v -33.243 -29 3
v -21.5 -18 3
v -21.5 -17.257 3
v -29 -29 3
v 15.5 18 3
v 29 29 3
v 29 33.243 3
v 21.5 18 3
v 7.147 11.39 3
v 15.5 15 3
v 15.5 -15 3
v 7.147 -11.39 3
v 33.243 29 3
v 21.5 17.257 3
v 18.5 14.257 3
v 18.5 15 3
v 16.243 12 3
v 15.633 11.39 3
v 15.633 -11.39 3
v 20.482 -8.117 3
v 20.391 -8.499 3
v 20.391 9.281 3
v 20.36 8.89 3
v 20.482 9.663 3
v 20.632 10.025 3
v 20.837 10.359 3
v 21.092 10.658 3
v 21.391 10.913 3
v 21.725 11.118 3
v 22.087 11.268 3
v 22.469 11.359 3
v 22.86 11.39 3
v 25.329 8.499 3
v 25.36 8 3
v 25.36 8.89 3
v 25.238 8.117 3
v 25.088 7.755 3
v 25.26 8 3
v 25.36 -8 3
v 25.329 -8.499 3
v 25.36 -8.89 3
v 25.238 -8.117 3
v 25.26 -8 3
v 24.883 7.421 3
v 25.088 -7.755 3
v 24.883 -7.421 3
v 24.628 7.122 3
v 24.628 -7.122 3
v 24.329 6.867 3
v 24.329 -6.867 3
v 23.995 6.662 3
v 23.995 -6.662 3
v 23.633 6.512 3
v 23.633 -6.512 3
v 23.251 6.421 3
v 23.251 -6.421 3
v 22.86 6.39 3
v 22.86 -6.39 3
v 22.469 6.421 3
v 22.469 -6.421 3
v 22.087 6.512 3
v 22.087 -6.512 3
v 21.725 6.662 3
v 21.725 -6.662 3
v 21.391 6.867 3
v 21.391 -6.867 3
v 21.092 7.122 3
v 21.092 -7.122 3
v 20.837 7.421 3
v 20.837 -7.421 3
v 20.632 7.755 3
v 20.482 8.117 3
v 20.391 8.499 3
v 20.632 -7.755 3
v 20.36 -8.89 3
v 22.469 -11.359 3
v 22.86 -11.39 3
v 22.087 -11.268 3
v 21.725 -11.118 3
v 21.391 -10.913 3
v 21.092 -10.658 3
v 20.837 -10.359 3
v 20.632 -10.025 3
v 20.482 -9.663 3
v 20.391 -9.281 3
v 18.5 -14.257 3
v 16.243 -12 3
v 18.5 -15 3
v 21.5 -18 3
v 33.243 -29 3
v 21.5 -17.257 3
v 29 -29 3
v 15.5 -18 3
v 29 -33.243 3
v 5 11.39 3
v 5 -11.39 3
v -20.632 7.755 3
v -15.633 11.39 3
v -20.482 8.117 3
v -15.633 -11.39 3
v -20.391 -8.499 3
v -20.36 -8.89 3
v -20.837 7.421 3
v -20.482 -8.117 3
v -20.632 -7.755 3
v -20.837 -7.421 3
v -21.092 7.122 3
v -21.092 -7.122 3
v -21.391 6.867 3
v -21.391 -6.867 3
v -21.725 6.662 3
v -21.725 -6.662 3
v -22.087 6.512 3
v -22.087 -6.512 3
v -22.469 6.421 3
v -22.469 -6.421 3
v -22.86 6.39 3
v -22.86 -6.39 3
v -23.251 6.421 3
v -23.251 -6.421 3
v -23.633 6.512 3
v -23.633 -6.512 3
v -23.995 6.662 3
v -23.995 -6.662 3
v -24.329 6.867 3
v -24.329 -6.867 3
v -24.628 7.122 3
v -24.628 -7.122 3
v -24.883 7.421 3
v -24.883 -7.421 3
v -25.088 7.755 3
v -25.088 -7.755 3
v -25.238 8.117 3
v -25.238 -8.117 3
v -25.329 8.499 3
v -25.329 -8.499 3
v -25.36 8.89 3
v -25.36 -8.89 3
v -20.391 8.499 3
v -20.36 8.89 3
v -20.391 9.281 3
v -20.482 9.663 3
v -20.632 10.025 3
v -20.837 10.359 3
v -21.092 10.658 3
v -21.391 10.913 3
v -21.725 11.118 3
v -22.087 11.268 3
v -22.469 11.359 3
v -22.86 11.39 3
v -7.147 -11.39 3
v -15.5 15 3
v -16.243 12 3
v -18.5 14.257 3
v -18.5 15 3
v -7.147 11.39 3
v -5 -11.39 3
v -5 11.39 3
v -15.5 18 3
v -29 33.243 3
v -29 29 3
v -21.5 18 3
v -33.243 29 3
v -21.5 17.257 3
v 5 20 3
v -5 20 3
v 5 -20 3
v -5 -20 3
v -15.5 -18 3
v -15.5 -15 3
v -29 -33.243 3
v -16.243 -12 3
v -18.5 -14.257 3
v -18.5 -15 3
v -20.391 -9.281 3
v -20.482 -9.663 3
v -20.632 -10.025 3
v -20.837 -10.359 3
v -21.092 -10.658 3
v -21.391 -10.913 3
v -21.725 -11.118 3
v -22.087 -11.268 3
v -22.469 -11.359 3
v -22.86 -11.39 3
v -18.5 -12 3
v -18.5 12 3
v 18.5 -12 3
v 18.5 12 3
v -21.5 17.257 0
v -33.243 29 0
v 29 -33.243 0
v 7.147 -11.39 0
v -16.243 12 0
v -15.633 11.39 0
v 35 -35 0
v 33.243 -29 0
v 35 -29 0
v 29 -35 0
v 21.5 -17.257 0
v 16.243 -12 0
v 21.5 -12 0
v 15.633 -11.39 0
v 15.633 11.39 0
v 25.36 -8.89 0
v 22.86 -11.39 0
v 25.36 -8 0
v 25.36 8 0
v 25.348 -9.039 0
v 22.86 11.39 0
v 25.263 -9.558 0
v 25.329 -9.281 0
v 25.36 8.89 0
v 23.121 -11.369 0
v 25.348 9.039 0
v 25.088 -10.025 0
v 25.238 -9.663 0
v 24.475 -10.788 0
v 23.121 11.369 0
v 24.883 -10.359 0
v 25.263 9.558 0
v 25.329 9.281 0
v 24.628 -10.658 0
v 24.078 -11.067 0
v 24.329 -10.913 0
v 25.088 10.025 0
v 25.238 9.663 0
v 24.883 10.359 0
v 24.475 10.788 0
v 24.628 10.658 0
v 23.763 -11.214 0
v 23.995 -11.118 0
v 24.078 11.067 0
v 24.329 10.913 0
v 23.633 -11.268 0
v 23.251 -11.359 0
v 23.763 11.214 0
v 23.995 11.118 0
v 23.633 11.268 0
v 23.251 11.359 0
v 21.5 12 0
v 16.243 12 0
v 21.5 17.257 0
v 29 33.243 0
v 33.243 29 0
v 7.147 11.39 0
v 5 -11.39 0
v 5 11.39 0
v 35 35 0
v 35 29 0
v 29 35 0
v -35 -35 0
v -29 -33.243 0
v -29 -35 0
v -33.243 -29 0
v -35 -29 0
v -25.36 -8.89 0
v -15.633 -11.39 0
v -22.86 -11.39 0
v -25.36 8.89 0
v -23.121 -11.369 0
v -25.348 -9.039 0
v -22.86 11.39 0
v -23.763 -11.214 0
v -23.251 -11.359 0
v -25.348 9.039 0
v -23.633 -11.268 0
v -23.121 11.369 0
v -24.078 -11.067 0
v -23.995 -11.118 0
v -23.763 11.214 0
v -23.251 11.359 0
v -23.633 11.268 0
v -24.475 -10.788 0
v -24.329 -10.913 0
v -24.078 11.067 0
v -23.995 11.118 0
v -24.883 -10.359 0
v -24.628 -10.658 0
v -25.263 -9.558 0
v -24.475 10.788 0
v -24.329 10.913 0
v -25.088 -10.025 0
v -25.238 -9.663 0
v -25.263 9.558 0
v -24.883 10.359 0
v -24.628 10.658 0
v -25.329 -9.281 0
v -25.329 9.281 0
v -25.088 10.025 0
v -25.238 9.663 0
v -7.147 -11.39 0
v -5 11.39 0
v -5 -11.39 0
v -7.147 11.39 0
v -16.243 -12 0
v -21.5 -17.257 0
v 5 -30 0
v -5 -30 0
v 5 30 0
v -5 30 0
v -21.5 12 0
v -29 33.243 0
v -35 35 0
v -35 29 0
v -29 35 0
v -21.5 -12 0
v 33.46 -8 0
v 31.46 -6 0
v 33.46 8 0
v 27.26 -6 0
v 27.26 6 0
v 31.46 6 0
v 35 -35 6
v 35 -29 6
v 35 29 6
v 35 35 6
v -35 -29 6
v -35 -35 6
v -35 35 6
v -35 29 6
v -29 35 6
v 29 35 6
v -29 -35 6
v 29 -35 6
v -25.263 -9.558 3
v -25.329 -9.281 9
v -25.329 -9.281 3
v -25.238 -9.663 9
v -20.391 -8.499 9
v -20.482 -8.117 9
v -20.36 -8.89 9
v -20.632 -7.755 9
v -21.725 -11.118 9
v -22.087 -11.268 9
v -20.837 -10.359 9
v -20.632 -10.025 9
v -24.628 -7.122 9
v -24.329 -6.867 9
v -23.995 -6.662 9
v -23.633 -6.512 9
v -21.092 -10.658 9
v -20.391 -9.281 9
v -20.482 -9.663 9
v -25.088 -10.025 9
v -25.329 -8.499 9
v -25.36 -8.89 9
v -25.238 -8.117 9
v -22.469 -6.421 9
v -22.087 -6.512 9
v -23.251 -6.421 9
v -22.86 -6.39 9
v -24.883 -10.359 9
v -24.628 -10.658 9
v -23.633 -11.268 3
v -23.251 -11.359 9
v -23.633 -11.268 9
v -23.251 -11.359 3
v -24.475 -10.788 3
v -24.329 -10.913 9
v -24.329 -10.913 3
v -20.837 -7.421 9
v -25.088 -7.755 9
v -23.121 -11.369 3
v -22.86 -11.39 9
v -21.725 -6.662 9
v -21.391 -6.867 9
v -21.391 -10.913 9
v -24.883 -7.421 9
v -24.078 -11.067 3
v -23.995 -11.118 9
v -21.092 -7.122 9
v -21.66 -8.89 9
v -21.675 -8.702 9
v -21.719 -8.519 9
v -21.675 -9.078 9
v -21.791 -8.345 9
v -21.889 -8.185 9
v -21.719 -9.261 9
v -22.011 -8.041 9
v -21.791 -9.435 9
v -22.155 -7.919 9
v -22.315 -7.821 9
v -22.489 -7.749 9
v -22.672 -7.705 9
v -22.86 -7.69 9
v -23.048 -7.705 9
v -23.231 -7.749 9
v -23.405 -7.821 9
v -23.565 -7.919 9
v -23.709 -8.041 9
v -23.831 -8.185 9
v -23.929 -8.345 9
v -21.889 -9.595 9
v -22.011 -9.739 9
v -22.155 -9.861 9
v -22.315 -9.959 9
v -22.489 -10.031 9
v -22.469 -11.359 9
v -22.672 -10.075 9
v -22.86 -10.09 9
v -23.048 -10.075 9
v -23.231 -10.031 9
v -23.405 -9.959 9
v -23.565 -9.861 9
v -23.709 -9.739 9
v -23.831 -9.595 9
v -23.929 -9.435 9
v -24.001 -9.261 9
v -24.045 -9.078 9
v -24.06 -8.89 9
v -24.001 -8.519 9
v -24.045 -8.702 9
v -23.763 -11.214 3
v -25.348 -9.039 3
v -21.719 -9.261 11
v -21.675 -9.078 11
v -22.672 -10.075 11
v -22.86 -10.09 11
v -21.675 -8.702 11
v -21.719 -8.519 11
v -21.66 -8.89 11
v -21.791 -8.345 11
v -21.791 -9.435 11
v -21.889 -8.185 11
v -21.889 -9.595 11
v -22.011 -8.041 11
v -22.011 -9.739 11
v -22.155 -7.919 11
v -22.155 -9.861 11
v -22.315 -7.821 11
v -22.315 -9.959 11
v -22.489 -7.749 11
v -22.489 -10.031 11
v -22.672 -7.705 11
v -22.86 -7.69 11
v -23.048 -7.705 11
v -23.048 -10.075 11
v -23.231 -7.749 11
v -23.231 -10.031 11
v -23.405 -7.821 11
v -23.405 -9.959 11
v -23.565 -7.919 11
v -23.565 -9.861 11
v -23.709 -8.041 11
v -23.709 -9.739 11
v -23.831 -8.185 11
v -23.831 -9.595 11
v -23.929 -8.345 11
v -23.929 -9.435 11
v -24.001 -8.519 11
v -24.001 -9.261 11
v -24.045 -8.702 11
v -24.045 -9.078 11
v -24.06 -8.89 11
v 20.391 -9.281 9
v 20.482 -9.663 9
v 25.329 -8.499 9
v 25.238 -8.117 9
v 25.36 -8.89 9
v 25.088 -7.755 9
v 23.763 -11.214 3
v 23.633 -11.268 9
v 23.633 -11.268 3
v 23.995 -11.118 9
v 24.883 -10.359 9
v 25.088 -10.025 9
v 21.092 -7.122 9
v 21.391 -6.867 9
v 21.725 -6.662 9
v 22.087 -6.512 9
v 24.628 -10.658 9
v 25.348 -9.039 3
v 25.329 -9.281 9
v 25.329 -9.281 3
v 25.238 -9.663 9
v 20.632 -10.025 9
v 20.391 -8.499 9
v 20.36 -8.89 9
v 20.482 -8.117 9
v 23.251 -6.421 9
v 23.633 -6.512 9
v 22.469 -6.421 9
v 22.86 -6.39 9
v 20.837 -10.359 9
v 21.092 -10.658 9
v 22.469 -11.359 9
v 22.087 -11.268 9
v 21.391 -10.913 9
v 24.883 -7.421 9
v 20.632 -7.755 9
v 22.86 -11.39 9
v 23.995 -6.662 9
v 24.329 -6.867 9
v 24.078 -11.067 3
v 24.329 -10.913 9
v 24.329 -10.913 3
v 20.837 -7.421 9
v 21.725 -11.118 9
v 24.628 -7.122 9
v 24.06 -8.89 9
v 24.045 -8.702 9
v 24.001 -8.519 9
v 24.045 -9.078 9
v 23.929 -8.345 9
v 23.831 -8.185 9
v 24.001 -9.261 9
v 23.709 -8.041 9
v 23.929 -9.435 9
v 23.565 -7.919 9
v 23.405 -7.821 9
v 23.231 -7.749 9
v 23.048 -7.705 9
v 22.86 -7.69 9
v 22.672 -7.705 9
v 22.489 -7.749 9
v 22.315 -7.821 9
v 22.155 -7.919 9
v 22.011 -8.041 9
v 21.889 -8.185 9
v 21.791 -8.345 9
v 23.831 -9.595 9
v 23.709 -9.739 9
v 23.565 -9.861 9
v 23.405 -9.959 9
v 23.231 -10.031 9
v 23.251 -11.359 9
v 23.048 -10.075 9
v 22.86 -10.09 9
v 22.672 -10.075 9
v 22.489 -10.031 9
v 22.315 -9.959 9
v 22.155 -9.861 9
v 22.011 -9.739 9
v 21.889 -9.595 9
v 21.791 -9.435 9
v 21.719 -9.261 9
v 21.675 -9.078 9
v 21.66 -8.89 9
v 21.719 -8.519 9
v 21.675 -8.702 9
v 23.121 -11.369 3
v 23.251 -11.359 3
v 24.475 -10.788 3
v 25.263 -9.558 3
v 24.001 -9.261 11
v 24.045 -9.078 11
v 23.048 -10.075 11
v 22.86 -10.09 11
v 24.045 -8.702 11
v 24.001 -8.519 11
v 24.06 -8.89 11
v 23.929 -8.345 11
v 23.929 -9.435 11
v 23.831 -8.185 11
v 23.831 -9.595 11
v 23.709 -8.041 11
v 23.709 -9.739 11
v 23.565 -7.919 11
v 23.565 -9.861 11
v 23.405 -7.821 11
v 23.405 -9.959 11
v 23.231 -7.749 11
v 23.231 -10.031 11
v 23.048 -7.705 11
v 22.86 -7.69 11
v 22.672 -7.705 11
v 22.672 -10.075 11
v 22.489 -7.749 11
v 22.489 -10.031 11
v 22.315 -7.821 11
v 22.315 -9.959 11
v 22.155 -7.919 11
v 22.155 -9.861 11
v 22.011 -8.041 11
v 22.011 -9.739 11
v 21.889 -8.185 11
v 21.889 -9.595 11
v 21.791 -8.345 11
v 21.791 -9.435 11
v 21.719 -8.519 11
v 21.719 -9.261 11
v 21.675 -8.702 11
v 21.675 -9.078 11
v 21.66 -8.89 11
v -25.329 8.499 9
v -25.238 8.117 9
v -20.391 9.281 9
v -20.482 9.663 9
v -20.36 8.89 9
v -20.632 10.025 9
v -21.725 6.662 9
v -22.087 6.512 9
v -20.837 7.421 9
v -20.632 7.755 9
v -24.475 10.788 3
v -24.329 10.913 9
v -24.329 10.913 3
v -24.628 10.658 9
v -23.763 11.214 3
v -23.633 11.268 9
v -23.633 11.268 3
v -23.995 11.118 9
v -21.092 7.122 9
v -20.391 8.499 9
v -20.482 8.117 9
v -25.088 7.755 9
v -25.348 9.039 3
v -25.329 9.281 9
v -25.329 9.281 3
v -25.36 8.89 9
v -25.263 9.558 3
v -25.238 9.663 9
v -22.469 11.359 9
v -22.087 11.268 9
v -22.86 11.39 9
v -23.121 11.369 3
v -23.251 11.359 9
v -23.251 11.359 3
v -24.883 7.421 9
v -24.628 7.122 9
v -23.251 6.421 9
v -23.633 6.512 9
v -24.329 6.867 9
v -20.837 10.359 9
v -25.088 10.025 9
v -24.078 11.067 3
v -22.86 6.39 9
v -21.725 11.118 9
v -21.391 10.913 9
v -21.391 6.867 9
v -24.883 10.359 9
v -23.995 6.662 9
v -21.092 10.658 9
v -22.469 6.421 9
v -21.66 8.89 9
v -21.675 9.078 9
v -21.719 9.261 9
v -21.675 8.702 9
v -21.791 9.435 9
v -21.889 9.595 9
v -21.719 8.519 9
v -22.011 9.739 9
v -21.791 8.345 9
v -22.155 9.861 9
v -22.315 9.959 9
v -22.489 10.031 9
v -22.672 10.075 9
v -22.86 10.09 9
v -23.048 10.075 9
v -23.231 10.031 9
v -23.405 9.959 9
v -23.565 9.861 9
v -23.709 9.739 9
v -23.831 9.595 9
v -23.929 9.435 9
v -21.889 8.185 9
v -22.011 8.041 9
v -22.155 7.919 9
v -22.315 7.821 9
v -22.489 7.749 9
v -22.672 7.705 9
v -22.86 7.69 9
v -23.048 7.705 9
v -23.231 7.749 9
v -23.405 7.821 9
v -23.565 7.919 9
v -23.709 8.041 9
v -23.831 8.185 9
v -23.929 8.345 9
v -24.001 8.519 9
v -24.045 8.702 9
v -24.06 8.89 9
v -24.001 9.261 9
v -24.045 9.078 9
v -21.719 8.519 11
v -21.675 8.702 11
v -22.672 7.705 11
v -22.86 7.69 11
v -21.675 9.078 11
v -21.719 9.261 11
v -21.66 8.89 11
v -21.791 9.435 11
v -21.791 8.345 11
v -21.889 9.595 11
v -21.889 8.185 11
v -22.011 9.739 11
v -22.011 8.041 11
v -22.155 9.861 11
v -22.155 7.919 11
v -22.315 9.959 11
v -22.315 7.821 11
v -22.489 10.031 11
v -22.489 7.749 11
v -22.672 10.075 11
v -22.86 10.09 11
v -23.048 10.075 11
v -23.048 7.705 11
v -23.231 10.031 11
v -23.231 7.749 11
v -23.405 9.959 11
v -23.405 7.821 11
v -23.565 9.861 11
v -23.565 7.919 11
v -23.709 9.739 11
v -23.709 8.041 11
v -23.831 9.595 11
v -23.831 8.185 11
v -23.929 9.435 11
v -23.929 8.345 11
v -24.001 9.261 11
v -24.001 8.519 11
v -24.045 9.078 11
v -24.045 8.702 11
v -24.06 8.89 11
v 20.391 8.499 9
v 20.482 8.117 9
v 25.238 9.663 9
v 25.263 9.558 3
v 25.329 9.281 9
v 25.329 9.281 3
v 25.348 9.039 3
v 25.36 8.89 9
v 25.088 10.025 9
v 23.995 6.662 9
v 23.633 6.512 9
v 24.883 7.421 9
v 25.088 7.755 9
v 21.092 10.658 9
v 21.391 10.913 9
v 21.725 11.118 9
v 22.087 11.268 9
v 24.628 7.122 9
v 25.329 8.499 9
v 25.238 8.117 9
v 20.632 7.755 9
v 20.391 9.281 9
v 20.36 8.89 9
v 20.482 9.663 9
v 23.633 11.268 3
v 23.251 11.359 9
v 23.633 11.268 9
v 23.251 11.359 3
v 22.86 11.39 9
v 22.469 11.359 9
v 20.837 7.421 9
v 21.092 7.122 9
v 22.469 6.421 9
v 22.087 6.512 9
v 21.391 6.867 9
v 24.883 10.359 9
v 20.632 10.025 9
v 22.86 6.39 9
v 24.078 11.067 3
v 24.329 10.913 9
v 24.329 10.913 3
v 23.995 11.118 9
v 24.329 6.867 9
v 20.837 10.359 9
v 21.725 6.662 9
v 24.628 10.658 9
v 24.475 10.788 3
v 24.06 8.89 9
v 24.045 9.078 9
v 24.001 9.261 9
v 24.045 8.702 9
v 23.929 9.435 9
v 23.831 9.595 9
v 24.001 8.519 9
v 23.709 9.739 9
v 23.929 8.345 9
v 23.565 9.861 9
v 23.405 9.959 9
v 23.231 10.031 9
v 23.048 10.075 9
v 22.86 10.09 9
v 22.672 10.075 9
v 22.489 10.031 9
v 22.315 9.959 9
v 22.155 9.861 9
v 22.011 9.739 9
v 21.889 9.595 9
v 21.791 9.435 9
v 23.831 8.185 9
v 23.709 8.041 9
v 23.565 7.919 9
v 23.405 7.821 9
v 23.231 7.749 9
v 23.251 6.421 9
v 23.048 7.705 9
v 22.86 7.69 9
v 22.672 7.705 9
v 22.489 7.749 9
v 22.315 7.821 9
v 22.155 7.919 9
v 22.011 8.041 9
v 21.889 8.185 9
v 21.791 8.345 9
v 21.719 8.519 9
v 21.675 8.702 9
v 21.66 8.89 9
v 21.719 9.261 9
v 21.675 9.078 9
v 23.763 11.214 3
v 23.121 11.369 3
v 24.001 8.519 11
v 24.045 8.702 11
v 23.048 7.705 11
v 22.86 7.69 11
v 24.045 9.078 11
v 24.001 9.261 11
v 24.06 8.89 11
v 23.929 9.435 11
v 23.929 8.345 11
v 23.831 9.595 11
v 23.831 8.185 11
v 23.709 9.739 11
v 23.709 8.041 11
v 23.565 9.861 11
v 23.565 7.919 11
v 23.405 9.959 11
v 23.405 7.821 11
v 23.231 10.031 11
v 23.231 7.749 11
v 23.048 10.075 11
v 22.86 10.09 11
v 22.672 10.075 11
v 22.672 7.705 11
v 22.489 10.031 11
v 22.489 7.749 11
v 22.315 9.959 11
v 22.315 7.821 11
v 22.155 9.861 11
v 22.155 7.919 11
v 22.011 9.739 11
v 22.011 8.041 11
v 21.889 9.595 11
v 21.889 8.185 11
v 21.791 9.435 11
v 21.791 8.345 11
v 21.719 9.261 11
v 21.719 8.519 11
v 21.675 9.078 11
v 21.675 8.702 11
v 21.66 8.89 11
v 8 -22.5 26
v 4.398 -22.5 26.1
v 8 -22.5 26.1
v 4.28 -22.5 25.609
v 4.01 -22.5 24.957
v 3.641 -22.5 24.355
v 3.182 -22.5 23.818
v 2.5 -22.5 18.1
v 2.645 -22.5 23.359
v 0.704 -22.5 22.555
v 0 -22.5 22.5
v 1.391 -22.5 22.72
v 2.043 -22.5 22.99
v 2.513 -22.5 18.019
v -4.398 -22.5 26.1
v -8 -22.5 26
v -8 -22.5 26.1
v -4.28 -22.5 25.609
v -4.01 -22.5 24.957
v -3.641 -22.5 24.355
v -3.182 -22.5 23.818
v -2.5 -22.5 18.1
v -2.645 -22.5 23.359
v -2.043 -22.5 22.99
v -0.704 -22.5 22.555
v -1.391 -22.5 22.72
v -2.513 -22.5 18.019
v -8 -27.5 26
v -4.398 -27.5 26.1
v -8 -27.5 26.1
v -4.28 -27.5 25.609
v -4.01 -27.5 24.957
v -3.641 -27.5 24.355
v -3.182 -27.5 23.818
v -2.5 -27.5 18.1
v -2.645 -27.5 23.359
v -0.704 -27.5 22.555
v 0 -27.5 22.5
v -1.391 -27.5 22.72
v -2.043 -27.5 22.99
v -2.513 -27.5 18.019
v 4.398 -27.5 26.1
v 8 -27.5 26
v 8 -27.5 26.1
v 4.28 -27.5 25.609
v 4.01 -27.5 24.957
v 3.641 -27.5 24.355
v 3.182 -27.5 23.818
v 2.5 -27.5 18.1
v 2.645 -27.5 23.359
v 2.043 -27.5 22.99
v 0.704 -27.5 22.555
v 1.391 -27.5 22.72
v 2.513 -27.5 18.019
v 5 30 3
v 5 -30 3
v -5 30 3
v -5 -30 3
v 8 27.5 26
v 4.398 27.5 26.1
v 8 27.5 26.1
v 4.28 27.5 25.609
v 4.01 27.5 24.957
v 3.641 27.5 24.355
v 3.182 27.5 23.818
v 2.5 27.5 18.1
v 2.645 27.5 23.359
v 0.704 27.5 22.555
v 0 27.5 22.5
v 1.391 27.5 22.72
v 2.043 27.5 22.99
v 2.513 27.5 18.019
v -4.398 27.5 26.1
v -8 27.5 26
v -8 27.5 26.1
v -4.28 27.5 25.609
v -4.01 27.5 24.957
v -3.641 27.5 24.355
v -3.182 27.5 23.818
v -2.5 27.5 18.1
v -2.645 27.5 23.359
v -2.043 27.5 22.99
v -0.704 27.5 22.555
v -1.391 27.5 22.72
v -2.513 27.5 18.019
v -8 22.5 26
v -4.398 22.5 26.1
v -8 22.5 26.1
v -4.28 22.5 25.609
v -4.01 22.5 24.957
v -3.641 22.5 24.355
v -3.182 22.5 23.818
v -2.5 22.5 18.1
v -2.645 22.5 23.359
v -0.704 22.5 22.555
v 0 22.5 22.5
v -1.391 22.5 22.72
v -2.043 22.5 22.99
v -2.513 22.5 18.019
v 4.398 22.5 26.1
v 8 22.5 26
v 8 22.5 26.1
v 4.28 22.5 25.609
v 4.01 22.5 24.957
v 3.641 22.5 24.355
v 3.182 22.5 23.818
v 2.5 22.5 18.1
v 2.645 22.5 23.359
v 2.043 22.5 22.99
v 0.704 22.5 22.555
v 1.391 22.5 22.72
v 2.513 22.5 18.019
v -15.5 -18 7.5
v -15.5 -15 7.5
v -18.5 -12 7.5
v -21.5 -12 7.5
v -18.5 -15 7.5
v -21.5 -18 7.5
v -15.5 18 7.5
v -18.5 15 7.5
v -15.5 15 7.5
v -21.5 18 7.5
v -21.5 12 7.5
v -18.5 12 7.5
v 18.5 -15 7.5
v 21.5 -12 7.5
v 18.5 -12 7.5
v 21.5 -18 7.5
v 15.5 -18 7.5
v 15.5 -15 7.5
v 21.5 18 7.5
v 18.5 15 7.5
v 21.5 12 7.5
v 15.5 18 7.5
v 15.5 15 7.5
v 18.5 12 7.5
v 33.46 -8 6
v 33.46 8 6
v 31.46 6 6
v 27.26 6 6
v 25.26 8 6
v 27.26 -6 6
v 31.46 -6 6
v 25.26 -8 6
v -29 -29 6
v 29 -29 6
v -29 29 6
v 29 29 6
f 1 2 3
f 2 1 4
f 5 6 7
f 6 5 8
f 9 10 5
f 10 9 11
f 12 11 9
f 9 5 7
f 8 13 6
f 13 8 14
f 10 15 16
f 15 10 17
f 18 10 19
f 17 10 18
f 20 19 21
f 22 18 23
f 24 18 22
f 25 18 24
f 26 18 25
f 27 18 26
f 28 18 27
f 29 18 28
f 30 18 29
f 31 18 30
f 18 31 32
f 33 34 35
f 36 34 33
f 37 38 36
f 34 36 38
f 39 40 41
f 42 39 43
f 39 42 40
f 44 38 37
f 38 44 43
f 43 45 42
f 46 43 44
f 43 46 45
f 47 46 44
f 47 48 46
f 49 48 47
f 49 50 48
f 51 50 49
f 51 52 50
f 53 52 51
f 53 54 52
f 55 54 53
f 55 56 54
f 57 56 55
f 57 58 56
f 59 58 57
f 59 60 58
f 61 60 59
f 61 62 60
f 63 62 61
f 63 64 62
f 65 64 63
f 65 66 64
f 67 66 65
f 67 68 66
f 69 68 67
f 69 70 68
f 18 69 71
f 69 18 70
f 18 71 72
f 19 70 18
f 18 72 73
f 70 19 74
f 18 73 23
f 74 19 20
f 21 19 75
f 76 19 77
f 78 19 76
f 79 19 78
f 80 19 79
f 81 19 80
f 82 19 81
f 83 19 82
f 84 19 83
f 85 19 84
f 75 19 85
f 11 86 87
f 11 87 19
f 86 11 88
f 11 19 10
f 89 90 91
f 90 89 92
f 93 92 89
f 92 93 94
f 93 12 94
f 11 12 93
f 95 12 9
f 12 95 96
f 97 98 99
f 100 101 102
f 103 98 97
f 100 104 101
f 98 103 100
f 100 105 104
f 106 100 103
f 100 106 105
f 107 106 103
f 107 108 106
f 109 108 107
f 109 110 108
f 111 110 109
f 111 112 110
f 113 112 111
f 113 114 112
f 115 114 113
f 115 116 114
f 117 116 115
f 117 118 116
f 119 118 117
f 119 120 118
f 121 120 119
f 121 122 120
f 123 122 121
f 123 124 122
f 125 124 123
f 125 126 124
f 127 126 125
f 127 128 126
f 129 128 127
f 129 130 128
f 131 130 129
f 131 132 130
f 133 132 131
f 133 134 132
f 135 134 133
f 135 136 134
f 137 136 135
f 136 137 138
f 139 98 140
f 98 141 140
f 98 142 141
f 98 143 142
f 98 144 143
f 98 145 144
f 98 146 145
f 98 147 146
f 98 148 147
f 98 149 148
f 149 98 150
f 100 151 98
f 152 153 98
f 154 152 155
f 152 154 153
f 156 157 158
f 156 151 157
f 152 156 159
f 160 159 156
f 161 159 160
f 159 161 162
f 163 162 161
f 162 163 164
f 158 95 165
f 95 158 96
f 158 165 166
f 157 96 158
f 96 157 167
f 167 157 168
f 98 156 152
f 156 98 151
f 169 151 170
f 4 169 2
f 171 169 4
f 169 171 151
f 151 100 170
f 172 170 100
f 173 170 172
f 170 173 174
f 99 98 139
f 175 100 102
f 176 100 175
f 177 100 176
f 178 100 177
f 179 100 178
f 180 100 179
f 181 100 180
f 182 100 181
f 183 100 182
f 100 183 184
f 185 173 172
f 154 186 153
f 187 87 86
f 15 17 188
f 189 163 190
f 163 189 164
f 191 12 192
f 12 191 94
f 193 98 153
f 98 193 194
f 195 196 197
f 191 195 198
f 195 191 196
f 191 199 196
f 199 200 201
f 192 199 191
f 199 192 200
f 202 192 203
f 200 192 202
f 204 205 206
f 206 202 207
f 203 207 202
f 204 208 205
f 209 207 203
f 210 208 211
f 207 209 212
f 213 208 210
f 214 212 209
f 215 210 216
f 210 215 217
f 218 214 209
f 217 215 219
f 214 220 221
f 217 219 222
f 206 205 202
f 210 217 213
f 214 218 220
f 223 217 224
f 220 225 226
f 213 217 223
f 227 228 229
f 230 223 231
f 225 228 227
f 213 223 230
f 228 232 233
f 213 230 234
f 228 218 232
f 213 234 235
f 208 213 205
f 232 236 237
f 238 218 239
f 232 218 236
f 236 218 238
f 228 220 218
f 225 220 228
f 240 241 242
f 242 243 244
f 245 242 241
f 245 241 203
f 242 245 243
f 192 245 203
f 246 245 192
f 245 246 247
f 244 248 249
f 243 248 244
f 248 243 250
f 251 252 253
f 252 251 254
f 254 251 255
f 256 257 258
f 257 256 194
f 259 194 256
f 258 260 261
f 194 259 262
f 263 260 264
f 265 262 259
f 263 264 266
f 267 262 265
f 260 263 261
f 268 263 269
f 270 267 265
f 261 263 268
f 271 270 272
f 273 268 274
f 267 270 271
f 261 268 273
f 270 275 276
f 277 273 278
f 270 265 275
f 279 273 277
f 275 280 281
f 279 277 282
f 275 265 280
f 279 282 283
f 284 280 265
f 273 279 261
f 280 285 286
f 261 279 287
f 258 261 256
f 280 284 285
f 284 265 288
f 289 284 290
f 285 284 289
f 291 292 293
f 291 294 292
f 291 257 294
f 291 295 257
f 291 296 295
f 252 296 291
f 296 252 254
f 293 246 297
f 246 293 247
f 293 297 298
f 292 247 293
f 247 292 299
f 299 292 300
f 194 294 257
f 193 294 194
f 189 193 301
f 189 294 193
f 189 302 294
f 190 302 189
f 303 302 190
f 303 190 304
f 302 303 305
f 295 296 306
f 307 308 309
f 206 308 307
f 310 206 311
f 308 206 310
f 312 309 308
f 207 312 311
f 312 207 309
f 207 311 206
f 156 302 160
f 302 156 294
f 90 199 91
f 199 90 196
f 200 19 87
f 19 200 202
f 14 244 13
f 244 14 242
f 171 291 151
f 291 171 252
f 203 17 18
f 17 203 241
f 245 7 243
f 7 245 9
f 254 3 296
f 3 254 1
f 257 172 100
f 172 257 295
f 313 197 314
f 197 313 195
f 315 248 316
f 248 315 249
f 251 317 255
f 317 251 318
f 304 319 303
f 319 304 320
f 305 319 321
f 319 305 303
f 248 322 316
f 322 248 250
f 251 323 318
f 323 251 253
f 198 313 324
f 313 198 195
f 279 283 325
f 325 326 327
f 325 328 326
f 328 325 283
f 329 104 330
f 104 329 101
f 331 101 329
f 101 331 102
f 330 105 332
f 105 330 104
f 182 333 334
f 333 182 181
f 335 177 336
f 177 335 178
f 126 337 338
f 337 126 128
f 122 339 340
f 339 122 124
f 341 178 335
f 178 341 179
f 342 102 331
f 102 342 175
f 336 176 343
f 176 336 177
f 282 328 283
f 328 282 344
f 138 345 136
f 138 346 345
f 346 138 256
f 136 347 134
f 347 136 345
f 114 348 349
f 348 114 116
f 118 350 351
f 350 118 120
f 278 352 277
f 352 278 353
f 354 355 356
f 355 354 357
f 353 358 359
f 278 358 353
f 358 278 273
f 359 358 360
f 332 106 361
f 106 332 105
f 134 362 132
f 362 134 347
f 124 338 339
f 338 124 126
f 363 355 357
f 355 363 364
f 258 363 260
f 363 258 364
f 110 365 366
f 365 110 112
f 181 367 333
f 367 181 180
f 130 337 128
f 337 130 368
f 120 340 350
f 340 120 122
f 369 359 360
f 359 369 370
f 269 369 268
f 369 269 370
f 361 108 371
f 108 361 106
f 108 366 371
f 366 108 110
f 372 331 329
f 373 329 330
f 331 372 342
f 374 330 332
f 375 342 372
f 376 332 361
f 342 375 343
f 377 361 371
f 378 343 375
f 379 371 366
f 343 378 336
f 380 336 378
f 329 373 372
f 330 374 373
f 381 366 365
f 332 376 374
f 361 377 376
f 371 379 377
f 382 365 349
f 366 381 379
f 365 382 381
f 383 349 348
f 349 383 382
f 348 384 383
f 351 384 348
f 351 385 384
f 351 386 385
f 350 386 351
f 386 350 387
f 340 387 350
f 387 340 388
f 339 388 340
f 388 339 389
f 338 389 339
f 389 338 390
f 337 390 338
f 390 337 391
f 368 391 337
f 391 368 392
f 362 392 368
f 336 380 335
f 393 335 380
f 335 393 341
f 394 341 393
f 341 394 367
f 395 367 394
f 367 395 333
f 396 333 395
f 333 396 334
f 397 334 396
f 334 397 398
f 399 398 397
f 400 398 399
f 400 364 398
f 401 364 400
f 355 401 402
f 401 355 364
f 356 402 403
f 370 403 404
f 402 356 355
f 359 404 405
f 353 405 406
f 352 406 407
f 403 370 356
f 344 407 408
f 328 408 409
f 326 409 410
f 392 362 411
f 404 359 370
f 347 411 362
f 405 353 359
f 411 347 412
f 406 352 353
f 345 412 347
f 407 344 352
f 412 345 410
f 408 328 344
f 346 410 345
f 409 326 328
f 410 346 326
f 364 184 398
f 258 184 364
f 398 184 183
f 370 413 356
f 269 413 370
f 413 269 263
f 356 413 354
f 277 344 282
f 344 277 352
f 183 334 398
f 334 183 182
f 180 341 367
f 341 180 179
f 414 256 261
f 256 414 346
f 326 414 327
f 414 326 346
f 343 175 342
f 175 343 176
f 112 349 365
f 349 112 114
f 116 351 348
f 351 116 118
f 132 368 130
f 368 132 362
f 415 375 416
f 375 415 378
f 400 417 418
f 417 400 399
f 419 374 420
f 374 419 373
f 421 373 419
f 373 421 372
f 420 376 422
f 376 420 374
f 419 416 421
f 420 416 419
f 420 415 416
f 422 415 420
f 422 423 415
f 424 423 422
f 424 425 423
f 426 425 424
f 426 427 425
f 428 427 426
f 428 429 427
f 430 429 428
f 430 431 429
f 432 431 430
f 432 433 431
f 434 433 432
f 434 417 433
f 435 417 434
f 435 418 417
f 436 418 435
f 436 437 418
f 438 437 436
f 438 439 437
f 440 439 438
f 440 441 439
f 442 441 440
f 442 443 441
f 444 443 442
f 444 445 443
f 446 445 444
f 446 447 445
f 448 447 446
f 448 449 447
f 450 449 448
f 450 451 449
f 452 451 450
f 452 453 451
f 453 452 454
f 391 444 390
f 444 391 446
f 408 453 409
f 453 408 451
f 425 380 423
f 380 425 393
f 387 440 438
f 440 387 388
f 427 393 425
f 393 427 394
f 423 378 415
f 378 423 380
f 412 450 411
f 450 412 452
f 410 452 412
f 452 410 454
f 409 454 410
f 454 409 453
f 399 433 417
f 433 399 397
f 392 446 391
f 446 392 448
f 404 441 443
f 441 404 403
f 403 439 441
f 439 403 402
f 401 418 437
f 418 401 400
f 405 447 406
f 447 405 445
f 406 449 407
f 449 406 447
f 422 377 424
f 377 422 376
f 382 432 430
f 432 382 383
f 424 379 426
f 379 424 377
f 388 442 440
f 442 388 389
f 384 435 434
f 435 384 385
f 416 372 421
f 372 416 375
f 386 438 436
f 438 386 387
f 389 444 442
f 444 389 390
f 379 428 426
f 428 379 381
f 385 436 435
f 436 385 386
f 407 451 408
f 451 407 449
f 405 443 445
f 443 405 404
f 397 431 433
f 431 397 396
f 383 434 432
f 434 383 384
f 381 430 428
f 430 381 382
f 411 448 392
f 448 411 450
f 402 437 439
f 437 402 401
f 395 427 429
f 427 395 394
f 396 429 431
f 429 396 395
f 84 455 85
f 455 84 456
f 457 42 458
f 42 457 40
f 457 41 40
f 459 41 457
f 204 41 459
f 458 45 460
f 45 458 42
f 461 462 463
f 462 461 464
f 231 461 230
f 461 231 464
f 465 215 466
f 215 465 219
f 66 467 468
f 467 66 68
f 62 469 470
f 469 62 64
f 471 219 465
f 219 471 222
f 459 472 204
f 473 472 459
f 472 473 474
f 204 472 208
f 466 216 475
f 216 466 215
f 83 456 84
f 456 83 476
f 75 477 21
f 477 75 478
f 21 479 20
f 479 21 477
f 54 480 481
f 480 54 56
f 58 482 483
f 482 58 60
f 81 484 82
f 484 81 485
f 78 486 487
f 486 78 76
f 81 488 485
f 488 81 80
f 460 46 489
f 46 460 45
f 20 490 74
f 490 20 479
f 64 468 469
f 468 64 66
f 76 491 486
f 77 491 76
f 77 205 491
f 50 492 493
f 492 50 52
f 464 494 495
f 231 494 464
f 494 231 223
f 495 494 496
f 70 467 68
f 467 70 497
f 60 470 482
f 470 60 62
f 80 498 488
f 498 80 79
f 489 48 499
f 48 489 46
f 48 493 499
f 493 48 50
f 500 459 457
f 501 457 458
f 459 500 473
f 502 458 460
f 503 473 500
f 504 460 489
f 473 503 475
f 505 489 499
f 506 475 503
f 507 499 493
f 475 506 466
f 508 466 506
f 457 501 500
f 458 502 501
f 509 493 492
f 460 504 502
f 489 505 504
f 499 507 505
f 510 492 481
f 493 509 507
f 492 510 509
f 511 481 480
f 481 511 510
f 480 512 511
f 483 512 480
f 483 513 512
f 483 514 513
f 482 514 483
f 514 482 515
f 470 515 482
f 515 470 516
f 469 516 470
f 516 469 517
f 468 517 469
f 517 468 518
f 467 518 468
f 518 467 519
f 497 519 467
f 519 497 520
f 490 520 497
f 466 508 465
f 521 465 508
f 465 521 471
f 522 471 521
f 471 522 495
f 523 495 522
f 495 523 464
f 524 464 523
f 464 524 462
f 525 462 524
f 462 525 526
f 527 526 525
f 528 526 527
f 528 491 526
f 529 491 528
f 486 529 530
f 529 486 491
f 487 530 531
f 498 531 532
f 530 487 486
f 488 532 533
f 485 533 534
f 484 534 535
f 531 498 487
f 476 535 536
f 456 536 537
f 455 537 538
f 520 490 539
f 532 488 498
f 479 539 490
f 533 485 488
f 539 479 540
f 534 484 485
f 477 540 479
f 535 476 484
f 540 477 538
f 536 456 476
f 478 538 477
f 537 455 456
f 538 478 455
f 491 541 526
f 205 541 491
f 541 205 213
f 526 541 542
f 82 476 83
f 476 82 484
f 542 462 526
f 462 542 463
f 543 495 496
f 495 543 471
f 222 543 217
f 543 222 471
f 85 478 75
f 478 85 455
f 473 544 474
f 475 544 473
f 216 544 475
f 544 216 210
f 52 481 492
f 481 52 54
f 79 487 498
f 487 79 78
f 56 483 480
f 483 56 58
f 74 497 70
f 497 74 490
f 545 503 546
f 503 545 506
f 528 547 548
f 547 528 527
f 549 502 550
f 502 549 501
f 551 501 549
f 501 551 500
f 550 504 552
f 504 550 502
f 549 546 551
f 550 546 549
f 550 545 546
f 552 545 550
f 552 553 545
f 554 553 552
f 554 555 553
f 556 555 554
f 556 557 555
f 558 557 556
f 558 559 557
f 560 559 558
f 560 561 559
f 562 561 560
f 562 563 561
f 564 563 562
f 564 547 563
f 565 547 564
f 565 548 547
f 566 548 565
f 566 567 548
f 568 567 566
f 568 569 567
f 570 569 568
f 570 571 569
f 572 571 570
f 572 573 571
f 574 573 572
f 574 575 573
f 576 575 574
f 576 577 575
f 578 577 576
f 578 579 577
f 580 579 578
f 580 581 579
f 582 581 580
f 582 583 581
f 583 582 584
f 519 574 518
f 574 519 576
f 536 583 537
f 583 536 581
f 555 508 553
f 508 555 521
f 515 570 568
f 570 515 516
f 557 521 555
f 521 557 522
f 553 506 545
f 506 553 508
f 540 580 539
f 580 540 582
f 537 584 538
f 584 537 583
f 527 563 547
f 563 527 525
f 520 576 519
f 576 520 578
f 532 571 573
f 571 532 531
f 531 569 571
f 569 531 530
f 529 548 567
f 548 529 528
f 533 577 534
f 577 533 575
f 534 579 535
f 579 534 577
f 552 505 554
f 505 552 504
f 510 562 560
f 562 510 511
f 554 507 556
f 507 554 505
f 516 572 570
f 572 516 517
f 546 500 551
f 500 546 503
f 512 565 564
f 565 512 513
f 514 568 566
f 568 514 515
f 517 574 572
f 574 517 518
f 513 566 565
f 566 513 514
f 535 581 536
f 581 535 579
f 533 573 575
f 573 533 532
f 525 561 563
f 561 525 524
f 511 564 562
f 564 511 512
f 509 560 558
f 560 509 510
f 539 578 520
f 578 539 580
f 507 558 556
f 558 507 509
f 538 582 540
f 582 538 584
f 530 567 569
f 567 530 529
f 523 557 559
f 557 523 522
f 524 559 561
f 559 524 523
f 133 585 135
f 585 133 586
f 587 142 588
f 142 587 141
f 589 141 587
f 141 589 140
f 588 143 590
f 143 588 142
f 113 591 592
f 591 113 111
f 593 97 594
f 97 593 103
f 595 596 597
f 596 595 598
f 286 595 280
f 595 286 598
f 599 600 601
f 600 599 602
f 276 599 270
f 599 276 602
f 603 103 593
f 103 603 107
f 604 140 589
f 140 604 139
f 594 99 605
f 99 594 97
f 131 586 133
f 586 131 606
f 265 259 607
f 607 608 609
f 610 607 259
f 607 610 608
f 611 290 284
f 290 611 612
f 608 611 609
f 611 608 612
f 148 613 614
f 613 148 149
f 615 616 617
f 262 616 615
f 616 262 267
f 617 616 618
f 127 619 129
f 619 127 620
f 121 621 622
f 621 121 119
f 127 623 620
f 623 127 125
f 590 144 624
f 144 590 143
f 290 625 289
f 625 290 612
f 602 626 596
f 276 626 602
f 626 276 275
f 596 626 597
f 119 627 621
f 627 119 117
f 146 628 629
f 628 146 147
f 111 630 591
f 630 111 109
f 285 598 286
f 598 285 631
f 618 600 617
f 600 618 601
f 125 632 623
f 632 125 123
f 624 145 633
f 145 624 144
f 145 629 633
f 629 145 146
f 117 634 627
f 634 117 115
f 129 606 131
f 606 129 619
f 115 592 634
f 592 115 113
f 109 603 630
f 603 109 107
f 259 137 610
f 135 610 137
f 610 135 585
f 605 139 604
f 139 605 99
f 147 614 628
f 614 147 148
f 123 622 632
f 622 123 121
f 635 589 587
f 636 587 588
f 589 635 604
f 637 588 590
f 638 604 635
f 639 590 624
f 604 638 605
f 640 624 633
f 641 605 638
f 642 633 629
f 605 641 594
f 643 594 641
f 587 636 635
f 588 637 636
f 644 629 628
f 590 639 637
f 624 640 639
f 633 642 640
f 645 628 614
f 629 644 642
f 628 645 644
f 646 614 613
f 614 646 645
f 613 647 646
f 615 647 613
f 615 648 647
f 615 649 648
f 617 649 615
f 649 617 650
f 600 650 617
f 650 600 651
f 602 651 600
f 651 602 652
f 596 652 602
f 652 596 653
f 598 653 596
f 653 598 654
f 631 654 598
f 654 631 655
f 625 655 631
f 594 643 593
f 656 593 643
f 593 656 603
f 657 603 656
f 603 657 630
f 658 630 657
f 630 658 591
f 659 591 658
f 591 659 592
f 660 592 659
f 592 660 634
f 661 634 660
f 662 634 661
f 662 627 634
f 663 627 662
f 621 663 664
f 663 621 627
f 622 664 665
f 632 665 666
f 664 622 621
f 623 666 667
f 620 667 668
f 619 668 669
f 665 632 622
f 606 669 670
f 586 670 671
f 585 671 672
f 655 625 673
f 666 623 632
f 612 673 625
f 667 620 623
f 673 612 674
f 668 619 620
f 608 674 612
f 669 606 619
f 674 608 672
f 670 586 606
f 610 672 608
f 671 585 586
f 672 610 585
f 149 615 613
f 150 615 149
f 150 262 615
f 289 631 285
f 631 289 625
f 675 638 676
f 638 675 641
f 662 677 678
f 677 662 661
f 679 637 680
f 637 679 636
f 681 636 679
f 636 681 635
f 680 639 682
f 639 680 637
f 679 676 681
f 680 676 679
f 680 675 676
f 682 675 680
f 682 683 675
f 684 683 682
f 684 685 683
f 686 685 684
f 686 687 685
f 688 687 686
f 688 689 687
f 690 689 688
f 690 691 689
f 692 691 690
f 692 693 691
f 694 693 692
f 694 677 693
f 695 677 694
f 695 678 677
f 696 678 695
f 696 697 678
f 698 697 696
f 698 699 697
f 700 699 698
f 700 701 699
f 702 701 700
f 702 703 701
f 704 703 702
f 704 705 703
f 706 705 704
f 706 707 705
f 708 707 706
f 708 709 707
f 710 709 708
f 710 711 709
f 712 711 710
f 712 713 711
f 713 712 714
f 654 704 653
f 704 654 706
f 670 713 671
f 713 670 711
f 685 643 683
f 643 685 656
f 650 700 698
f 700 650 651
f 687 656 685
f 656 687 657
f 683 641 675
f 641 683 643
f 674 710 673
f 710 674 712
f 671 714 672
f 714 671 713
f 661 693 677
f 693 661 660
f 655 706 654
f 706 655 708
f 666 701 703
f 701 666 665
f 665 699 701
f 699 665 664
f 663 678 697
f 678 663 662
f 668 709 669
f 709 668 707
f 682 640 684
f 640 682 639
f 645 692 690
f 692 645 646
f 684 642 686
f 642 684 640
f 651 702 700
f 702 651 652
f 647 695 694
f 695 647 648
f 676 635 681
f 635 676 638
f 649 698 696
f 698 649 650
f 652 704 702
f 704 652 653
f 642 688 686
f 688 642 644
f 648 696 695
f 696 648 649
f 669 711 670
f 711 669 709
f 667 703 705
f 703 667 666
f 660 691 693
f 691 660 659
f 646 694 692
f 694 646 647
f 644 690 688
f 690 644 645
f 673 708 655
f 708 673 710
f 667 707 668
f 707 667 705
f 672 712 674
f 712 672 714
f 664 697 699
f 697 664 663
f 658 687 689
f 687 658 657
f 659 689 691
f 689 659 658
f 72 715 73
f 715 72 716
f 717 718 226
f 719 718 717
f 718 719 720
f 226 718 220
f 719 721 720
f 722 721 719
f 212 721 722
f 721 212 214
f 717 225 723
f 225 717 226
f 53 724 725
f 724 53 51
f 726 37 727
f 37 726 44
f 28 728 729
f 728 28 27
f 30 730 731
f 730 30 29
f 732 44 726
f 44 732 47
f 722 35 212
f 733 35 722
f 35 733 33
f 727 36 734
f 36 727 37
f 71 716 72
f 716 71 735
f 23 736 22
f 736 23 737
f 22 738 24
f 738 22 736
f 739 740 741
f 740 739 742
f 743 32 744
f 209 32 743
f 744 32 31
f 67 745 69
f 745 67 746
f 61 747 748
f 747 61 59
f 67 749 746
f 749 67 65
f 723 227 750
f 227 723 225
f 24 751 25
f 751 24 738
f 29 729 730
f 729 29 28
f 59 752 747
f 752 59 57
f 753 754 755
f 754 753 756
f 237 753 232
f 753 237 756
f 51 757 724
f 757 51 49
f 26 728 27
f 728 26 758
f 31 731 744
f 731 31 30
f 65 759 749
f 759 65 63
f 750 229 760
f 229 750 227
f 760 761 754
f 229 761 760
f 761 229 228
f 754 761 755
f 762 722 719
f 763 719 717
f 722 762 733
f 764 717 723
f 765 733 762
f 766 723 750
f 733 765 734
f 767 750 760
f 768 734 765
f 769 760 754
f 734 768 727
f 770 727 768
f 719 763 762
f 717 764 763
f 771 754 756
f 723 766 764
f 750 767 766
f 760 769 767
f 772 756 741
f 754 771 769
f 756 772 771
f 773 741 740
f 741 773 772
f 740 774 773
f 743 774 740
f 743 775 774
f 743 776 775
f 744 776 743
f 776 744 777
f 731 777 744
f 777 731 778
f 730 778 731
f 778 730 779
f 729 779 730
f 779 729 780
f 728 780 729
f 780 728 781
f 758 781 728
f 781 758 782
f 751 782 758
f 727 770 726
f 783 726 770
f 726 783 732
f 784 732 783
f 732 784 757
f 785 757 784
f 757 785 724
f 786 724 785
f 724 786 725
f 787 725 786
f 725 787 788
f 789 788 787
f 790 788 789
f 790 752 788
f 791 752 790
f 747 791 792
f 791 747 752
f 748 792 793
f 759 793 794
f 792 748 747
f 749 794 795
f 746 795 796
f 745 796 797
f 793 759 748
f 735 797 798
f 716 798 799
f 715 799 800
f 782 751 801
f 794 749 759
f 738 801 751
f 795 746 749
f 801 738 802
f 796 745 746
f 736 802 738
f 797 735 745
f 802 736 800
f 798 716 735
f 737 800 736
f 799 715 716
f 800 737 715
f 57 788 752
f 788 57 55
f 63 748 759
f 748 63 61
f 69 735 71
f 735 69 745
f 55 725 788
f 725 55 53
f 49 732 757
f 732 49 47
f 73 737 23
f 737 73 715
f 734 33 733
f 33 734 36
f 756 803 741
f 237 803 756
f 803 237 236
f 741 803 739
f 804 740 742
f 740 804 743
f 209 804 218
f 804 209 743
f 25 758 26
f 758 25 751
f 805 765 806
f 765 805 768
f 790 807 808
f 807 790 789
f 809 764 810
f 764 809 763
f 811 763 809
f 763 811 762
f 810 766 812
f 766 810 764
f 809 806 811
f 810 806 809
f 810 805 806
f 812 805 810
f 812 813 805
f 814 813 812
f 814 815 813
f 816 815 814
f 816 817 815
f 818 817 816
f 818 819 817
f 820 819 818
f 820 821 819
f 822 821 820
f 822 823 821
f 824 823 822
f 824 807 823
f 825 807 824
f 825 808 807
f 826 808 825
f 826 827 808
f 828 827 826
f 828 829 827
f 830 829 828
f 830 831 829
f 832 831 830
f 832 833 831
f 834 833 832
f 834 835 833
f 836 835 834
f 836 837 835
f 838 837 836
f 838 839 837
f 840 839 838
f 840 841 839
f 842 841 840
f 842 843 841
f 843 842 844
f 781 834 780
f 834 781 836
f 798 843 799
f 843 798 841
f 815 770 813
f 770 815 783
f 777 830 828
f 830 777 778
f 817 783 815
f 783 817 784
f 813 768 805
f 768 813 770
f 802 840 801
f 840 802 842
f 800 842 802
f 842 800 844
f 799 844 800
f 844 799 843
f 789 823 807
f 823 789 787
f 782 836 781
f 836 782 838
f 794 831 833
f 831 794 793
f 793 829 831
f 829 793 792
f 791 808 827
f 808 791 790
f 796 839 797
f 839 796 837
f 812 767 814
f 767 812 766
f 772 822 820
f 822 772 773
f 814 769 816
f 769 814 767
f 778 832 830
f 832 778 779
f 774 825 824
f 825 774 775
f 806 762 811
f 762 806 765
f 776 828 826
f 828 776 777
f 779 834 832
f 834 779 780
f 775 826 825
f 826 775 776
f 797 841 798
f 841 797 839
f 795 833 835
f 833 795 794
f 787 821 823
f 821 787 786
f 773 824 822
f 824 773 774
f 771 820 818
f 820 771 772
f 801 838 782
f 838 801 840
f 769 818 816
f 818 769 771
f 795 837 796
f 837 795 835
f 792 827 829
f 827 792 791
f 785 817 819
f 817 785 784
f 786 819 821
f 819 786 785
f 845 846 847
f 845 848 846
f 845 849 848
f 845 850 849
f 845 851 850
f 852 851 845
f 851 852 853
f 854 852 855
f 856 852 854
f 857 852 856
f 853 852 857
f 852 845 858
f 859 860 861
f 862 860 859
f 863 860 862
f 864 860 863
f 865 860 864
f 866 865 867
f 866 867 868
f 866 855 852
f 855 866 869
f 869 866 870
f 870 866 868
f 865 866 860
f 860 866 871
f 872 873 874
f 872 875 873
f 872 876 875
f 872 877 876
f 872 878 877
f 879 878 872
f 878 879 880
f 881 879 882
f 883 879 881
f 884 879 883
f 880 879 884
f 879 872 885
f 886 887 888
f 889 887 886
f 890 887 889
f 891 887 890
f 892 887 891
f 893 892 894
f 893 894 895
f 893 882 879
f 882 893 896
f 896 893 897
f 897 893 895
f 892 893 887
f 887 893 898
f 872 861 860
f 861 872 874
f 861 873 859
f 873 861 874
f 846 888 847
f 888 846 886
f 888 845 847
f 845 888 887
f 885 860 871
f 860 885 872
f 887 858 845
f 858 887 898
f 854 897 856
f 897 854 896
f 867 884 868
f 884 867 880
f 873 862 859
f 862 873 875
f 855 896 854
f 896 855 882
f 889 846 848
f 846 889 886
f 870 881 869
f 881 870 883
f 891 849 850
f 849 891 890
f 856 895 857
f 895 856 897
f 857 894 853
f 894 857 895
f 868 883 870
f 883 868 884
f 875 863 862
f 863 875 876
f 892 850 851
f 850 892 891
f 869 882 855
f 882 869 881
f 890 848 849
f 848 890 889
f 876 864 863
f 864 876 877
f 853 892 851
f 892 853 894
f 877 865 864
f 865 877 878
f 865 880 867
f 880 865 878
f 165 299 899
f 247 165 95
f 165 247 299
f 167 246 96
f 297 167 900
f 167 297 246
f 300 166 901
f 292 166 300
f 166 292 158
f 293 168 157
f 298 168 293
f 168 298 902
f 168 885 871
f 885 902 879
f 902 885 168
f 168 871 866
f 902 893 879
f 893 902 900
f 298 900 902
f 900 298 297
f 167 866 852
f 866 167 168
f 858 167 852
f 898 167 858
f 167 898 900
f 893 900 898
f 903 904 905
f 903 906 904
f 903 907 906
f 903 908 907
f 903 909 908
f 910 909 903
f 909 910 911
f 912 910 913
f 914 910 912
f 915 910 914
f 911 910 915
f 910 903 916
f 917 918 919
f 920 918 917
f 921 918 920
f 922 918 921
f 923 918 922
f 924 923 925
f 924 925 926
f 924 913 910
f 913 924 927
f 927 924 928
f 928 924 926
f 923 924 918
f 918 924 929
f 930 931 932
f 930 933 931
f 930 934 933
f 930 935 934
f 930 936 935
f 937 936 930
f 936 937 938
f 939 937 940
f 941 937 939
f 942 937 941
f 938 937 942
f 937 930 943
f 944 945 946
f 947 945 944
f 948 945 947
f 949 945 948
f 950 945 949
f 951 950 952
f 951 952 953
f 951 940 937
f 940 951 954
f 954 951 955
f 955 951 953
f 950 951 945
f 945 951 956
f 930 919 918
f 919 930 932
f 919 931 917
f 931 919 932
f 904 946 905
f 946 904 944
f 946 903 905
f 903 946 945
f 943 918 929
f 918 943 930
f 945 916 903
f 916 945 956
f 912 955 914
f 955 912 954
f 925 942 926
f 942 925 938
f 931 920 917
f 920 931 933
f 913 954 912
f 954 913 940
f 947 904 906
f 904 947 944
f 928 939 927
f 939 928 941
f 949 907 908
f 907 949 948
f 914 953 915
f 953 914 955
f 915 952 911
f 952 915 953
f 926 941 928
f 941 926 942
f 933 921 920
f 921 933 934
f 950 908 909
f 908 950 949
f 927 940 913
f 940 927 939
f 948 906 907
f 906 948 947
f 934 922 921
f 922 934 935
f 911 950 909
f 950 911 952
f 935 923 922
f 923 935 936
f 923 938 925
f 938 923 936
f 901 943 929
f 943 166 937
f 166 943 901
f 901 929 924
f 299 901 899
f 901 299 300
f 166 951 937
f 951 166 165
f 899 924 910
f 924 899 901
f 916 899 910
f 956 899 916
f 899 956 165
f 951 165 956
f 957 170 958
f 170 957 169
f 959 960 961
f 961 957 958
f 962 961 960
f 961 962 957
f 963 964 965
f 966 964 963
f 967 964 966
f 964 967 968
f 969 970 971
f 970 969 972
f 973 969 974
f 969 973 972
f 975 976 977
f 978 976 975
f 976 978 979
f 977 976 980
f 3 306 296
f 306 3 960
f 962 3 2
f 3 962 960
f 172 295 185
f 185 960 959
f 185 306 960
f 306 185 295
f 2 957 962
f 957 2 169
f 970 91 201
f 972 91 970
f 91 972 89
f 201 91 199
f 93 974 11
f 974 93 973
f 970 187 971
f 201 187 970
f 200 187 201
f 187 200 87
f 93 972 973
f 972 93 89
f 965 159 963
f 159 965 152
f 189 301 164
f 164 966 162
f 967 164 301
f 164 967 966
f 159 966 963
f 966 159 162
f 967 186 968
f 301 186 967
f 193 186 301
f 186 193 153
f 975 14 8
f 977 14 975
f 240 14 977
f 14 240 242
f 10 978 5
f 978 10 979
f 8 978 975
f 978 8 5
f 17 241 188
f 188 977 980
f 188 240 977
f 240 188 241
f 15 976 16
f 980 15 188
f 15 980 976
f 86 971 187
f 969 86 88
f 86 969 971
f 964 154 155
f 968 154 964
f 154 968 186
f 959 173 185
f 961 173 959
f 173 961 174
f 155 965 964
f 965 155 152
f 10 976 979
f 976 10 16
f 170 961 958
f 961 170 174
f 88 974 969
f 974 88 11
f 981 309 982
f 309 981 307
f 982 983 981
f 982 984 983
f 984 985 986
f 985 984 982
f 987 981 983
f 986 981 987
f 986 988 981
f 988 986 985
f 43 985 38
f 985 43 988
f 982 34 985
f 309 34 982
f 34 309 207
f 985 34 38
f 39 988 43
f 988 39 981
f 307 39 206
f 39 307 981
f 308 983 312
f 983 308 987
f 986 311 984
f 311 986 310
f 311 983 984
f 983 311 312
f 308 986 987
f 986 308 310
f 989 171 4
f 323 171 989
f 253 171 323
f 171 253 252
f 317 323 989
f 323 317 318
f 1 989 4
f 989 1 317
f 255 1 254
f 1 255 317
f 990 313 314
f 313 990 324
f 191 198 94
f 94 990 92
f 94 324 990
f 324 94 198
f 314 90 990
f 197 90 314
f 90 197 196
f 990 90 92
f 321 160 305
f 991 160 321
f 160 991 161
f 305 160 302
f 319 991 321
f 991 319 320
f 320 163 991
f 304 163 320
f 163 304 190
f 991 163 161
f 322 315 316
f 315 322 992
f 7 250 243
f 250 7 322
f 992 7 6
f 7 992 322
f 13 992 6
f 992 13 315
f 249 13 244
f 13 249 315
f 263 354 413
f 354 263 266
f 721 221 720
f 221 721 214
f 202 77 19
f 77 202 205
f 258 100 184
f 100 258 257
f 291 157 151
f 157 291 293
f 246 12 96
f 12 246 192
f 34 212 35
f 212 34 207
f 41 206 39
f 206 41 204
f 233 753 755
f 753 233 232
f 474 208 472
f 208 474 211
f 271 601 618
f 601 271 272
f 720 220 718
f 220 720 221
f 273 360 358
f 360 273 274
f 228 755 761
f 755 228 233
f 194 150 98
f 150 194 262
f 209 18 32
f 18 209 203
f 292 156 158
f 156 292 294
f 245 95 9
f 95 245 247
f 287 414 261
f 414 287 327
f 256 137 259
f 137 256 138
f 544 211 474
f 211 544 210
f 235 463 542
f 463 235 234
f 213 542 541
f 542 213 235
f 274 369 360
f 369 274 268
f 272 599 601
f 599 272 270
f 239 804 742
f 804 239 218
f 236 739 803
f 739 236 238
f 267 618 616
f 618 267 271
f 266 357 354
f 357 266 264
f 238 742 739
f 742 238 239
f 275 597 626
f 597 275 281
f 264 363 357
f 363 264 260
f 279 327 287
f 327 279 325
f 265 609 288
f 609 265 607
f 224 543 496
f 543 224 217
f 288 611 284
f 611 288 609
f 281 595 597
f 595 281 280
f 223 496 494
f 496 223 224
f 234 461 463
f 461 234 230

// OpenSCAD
$fn=40;

EDGE  = 70;
STONE =  6;
PIN_X = 45.72;
PIN_Y = 17.78;
POST_BASE_D = 5;
POST_PIN_D  = 2.4;
POST_Z0 = STONE/2 + 6;
POST_Z1 = POST_Z0 + 2;
PLATE_X = 10;
PLATE_Y = 60;
BAT_X = 37;
BAT_Y = 30;
BAT_Z =  4.5;

module cubeBounds()
{
    translate([-EDGE/2, -EDGE/2, 0]) 
        cube(size=[EDGE, EDGE, EDGE]);
}

translate([-EDGE/2, -EDGE/2, 0]) 
    cube(size=[STONE, STONE, STONE]);
translate([EDGE/2 - STONE, -EDGE/2, 0]) 
    cube(size=[STONE, STONE, STONE]);
translate([-EDGE/2, EDGE/2 - STONE, 0]) 
    cube(size=[STONE, STONE, STONE]);
translate([EDGE/2 - STONE, EDGE/2 - STONE, 0]) 
    cube(size=[STONE, STONE, STONE]);
    
intersection() {
    cubeBounds();
    
     union() {
         rotate([0, 0, 45]) {
            translate([-STONE/2, -100, 0]) {
                cube(size=[STONE, 200, STONE/2]);
            }
         }
         rotate([0, 0, -45]) {
            translate([-STONE/2, -100, 0]) {
                cube(size=[STONE, 200, STONE/2]);
            }
        }
    }
}

hull() {
    translate([-PIN_X/2, -PIN_Y/2, 0])
        cylinder(d=POST_BASE_D, h=STONE/2);
    translate([PIN_X/2, -PIN_Y/2, 0])
        cylinder(d=POST_BASE_D, h=STONE/2);
    translate([-PIN_X/2, PIN_Y/2, 0])
        cylinder(d=POST_BASE_D, h=STONE/2);
    translate([PIN_X/2, PIN_Y/2, 0])
        cylinder(d=POST_BASE_D, h=STONE/2);
}


translate([-PIN_X/2, -PIN_Y/2, 0]) {
    cylinder(d=POST_BASE_D, h=POST_Z0);
    cylinder(d=POST_PIN_D, h=POST_Z1);
}
translate([PIN_X/2, -PIN_Y/2, 0]) {
    cylinder(d=POST_BASE_D, h=POST_Z0);
    cylinder(d=POST_PIN_D, h=POST_Z1);
}
translate([-PIN_X/2, PIN_Y/2, 0]) {
    cylinder(d=POST_BASE_D, h=POST_Z0);
    cylinder(d=POST_PIN_D, h=POST_Z1);
}
translate([PIN_X/2, PIN_Y/2, 0]) {
    cylinder(d=POST_BASE_D, h=POST_Z0);
    cylinder(d=POST_PIN_D, h=POST_Z1);
}

translate([-PLATE_X/2, -PLATE_Y/2, 0]) {
    cube(size=[PLATE_X, PLATE_Y, STONE/2]);
}

module pillar() {
    S0 = PLATE_X;
    S1 = S0 * 0.5;
    S2 = S0 * 1.6;
    H0 = 18;
    H1 = 26;

    hull() {
        translate([-S0/2, -S0/2, 0]) cube(size=[S0, S0, STONE/2]);
        translate([-S1/2, -S1/2, H0]) cube(size=[S1, S1, 0.1]);
    }    
    difference() 
    {
        hull() {
            translate([-S1/2, -S1/2, H0]) cube(size=[S1, S1, 0.1]);
            translate([-S2/2, -S1/2, H1]) cube(size=[S2, S1, 0.1]);
        }    
        translate([0, 10, 27]) rotate([90, 0, 0]) cylinder(h=20, d=9);
    }
}

translate([0, -PLATE_Y/2 + PLATE_X/2, 0]) {
    pillar();
}

translate([0, PLATE_Y/2 - PLATE_X/2, 0]) {
    pillar();
}

difference() {
    union() {
        translate([-BAT_X/2 - STONE/2, -BAT_Y/2 - STONE/2, 0])
            cube(size=[STONE, STONE, STONE/2 + BAT_Z]);
        translate([BAT_X/2 - STONE/2, -BAT_Y/2 - STONE/2, 0])
            cube(size=[STONE, STONE, STONE/2 + BAT_Z]);
        translate([-BAT_X/2 - STONE/2, BAT_Y/2 - STONE/2, 0])
            cube(size=[STONE, STONE, STONE/2 + BAT_Z]);
        translate([BAT_X/2 - STONE/2, BAT_Y/2 - STONE/2, 0])
            cube(size=[STONE, STONE, STONE/2 + BAT_Z]);
    }
    translate([-BAT_X/2, -BAT_Y/2, STONE/2]) 
        cube(size=[BAT_X, BAT_Y, BAT_Z]);
}


SW_T = 2;
SW_X = 4.2;
SW_Y = 12;
SW_Z = 6;

translate([PIN_X/2 + POST_PIN_D, -SW_Y/2 - SW_T, 0]) difference() {
    cube(size=[SW_X + SW_T*2, SW_Y + SW_T*2, SW_Z]);    
    translate([SW_T, SW_T, 0]) cube(size=[SW_X, SW_Y, 100]);
}
